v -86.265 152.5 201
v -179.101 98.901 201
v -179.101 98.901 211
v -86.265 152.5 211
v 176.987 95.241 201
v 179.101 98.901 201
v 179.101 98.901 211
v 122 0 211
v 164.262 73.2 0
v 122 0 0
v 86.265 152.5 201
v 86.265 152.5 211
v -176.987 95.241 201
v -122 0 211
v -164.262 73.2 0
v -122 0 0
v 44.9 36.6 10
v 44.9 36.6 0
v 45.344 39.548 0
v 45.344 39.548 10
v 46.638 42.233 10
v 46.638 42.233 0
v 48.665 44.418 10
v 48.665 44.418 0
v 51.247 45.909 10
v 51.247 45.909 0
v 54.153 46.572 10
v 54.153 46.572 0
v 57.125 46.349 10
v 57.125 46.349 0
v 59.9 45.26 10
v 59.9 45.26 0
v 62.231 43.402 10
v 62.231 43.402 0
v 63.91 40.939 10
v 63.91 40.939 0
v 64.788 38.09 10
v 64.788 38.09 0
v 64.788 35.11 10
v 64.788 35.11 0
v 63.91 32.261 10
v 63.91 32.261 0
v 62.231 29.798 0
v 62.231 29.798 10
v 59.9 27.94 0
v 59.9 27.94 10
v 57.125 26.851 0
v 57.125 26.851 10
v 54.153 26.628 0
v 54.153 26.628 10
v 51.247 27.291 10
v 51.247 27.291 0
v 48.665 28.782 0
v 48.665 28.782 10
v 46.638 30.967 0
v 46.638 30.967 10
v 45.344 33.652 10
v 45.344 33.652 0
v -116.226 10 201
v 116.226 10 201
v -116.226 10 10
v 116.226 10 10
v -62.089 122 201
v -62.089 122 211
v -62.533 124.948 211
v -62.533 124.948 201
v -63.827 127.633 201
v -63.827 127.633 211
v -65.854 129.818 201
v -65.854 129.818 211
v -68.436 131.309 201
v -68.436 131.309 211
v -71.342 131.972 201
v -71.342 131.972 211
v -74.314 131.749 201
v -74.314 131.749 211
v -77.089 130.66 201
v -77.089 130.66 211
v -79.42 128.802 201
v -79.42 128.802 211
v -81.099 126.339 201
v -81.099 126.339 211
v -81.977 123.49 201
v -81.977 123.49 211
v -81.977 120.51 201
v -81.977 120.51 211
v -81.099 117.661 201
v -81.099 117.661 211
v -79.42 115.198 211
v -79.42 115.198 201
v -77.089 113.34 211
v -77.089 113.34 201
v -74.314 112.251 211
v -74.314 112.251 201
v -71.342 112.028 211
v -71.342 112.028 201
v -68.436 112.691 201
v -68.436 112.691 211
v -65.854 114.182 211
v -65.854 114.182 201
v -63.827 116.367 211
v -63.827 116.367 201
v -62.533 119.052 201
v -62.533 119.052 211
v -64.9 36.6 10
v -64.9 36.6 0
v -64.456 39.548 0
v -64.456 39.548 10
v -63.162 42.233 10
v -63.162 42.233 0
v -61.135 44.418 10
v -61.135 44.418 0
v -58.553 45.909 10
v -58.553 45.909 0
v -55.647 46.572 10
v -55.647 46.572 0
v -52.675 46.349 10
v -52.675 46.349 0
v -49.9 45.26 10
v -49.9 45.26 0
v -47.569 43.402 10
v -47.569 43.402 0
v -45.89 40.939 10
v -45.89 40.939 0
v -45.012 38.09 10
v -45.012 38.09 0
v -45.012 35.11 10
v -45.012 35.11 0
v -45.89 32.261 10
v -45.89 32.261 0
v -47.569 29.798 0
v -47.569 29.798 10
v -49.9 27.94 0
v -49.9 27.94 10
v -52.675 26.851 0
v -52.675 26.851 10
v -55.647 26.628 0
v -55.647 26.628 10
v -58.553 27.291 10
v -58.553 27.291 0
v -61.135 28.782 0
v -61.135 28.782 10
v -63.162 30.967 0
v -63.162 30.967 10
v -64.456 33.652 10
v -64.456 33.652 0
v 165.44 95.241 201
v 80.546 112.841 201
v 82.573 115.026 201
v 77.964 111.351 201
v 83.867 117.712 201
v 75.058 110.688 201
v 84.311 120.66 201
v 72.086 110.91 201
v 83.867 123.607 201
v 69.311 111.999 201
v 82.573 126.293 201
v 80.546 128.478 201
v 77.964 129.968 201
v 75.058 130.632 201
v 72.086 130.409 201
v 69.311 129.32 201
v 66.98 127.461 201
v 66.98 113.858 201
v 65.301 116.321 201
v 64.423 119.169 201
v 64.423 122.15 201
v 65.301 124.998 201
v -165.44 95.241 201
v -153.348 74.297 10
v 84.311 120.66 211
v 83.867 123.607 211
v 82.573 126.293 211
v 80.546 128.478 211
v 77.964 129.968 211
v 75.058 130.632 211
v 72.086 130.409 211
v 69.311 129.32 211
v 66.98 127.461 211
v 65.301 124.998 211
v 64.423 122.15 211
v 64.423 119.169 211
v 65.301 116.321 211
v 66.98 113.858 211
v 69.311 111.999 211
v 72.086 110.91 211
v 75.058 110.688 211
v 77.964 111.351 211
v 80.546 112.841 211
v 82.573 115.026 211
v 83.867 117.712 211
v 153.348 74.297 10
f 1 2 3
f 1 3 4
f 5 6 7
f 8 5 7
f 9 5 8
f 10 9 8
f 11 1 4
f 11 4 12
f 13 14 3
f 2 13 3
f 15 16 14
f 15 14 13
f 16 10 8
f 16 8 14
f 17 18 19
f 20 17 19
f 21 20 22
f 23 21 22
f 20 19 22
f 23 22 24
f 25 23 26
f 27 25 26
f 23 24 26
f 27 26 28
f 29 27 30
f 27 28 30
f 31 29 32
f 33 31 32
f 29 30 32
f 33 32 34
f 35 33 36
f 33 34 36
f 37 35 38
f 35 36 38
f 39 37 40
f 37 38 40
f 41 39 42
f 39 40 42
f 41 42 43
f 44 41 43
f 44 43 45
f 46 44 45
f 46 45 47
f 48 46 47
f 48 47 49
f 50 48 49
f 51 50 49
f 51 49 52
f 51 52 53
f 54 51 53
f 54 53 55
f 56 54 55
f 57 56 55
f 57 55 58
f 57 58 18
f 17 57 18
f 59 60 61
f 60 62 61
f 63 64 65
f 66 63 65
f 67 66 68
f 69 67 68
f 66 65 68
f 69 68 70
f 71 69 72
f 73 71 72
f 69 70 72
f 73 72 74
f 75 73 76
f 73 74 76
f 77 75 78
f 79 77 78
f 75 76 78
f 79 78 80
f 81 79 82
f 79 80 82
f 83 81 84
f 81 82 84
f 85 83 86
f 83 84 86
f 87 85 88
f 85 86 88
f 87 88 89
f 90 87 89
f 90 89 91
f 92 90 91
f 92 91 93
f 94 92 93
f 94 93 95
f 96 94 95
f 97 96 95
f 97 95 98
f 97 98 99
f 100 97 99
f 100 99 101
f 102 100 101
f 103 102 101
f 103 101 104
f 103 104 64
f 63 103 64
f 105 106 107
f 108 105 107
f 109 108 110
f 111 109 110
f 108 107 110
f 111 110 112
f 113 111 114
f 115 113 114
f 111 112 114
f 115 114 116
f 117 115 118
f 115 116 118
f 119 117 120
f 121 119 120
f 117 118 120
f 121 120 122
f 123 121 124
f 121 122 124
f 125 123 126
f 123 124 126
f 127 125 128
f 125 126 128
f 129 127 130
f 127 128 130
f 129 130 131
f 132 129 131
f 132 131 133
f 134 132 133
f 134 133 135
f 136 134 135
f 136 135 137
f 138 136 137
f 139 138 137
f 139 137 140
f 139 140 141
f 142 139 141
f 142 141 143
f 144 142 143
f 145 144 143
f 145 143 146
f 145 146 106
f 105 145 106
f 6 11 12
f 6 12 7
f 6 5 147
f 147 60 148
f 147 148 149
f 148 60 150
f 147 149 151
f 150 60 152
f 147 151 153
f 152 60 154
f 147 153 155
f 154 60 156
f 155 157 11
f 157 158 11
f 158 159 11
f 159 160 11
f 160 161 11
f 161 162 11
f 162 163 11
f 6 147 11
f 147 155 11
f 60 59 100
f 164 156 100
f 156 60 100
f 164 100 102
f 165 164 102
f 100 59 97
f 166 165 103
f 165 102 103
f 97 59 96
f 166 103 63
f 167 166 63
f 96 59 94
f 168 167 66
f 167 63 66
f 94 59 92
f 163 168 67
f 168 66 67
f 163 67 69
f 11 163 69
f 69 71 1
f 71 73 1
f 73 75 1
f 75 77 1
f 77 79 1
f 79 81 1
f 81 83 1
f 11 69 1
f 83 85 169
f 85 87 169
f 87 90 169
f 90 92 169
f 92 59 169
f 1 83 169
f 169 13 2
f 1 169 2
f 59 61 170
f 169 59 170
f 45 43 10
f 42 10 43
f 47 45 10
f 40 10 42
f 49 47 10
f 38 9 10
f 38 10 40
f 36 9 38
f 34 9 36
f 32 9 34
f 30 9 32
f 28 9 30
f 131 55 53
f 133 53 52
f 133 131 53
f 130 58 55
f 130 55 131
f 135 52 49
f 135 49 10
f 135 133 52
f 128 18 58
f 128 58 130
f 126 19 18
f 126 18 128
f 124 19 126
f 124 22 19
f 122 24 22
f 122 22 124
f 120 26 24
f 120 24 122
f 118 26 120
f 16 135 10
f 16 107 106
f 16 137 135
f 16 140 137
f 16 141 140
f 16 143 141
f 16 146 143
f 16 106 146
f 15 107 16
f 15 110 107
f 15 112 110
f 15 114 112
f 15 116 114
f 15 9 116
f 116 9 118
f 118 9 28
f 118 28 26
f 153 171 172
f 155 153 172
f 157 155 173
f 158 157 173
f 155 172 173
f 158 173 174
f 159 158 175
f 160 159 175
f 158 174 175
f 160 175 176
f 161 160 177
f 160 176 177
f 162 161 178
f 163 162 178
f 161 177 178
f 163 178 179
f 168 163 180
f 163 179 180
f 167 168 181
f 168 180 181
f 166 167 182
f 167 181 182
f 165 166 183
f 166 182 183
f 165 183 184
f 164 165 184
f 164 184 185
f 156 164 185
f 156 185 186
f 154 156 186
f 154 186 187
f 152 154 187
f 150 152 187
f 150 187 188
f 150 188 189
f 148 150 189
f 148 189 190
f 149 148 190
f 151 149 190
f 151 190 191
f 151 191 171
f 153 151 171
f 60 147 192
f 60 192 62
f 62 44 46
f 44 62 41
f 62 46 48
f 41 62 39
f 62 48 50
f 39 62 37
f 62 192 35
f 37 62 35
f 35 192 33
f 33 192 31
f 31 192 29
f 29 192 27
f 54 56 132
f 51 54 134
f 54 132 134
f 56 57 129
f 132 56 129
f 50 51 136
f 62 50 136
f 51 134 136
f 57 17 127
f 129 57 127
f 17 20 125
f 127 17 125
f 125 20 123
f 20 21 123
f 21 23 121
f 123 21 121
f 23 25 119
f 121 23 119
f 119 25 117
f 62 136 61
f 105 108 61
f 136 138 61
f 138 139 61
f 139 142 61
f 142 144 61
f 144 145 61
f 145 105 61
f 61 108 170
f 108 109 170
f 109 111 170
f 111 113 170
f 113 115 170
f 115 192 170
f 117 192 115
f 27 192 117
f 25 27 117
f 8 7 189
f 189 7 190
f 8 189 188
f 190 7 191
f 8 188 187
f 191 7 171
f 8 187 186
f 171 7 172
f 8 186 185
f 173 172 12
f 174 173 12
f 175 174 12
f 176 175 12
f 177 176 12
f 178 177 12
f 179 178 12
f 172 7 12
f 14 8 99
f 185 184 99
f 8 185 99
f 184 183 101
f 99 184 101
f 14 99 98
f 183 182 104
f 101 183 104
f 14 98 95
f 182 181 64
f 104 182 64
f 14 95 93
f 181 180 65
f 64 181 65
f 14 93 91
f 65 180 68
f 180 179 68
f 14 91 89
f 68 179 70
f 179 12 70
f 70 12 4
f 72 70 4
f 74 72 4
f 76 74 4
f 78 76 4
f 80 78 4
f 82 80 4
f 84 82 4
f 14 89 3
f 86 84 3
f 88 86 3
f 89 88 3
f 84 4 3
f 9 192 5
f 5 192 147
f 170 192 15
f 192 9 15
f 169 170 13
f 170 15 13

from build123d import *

# Parameters (mm, degrees)
EXTRUDE_1_DEPTH          = 211
SHELL_1_T                = 10
CUT_EXTRUDE_5_REACH      = 317.997
SKETCH_4_R               = 10
CUT_EXTRUDE_6_REACH      = 317.997
SKETCH_5_R               = 10
CUT_EXTRUDE_9_DEPTH      = 316.997319763
CUT_EXTRUDE_9_DEPTH_BACK = 316.997319763


with BuildPart() as part:
    # 草图1 → 凸台-拉伸1 (new body)
    with BuildSketch(Plane.XY):
        Polygon((122, 0), (-122, 0), (-179.100687039, 98.901291098), (-86.265, 152.5), (86.265, 152.5), (179.100687039, 98.901291098), align=None)
    extrude(amount=EXTRUDE_1_DEPTH)

    # 抽壳1 (no face opened: a closed hollow body)
    add(offset(amount=-SHELL_1_T, mode=Mode.PRIVATE), mode=Mode.SUBTRACT)

    # 草图4 → 切除-拉伸5 (cut, up to next)
    with BuildSketch(Plane(origin=(0, 0, 0), x_dir=(-1, 0, 0), z_dir=(0, 0, -1)), mode=Mode.PRIVATE) as cut_extrude_5_sk1:
        with Locations((-54.9, 36.6)):
            Circle(SKETCH_4_R)
    cut_extrude_5_tool1 = extrude(cut_extrude_5_sk1.sketch, amount=-CUT_EXTRUDE_5_REACH, mode=Mode.PRIVATE) & part.part
    # 草图4 → 切除-拉伸5 (cut, up to next)
    with BuildSketch(Plane(origin=(0, 0, 0), x_dir=(-1, 0, 0), z_dir=(0, 0, -1)), mode=Mode.PRIVATE) as cut_extrude_5_sk2:
        with Locations((54.9, 36.6)):
            Circle(SKETCH_4_R)
    cut_extrude_5_tool2 = extrude(cut_extrude_5_sk2.sketch, amount=-CUT_EXTRUDE_5_REACH, mode=Mode.PRIVATE) & part.part
    add(cut_extrude_5_tool1.solids().sort_by_distance((54.9, 36.6, 0))[0], mode=Mode.SUBTRACT)
    add(cut_extrude_5_tool2.solids().sort_by_distance((-54.9, 36.6, 0))[0], mode=Mode.SUBTRACT)

    # 草图5 → 切除-拉伸6 (cut, up to next)
    with BuildSketch(Plane.XY.offset(211), mode=Mode.PRIVATE) as cut_extrude_6_sk1:
        with Locations((-72.089123196, 122)):
            Circle(SKETCH_5_R)
    cut_extrude_6_tool1 = extrude(cut_extrude_6_sk1.sketch, amount=-CUT_EXTRUDE_6_REACH, mode=Mode.PRIVATE) & part.part
    # 草图5 → 切除-拉伸6 (cut, up to next)
    with BuildSketch(Plane.XY.offset(211), mode=Mode.PRIVATE) as cut_extrude_6_sk2:
        with Locations((74.310876804, 120.659584251)):
            Circle(SKETCH_5_R)
    cut_extrude_6_tool2 = extrude(cut_extrude_6_sk2.sketch, amount=-CUT_EXTRUDE_6_REACH, mode=Mode.PRIVATE) & part.part
    add(cut_extrude_6_tool1.solids().sort_by_distance((-72.089123, 122, 211))[0], mode=Mode.SUBTRACT)
    add(cut_extrude_6_tool2.solids().sort_by_distance((74.310877, 120.659584, 211))[0], mode=Mode.SUBTRACT)

    # 草图7 → 切除-拉伸9 (cut, two sides: drawn at the far end of the back side and taken through both)
    with BuildSketch(Plane(origin=(0, 0, 0), x_dir=(0, 0, -1), z_dir=(1, 0, 0)).offset(-CUT_EXTRUDE_9_DEPTH_BACK)):
        Polygon((0, 73.2), (-201, 95.24103706), (-201, 152.5), (0, 152.5), align=None)
    extrude(amount=CUT_EXTRUDE_9_DEPTH + CUT_EXTRUDE_9_DEPTH_BACK, mode=Mode.SUBTRACT)


solid = part.part
